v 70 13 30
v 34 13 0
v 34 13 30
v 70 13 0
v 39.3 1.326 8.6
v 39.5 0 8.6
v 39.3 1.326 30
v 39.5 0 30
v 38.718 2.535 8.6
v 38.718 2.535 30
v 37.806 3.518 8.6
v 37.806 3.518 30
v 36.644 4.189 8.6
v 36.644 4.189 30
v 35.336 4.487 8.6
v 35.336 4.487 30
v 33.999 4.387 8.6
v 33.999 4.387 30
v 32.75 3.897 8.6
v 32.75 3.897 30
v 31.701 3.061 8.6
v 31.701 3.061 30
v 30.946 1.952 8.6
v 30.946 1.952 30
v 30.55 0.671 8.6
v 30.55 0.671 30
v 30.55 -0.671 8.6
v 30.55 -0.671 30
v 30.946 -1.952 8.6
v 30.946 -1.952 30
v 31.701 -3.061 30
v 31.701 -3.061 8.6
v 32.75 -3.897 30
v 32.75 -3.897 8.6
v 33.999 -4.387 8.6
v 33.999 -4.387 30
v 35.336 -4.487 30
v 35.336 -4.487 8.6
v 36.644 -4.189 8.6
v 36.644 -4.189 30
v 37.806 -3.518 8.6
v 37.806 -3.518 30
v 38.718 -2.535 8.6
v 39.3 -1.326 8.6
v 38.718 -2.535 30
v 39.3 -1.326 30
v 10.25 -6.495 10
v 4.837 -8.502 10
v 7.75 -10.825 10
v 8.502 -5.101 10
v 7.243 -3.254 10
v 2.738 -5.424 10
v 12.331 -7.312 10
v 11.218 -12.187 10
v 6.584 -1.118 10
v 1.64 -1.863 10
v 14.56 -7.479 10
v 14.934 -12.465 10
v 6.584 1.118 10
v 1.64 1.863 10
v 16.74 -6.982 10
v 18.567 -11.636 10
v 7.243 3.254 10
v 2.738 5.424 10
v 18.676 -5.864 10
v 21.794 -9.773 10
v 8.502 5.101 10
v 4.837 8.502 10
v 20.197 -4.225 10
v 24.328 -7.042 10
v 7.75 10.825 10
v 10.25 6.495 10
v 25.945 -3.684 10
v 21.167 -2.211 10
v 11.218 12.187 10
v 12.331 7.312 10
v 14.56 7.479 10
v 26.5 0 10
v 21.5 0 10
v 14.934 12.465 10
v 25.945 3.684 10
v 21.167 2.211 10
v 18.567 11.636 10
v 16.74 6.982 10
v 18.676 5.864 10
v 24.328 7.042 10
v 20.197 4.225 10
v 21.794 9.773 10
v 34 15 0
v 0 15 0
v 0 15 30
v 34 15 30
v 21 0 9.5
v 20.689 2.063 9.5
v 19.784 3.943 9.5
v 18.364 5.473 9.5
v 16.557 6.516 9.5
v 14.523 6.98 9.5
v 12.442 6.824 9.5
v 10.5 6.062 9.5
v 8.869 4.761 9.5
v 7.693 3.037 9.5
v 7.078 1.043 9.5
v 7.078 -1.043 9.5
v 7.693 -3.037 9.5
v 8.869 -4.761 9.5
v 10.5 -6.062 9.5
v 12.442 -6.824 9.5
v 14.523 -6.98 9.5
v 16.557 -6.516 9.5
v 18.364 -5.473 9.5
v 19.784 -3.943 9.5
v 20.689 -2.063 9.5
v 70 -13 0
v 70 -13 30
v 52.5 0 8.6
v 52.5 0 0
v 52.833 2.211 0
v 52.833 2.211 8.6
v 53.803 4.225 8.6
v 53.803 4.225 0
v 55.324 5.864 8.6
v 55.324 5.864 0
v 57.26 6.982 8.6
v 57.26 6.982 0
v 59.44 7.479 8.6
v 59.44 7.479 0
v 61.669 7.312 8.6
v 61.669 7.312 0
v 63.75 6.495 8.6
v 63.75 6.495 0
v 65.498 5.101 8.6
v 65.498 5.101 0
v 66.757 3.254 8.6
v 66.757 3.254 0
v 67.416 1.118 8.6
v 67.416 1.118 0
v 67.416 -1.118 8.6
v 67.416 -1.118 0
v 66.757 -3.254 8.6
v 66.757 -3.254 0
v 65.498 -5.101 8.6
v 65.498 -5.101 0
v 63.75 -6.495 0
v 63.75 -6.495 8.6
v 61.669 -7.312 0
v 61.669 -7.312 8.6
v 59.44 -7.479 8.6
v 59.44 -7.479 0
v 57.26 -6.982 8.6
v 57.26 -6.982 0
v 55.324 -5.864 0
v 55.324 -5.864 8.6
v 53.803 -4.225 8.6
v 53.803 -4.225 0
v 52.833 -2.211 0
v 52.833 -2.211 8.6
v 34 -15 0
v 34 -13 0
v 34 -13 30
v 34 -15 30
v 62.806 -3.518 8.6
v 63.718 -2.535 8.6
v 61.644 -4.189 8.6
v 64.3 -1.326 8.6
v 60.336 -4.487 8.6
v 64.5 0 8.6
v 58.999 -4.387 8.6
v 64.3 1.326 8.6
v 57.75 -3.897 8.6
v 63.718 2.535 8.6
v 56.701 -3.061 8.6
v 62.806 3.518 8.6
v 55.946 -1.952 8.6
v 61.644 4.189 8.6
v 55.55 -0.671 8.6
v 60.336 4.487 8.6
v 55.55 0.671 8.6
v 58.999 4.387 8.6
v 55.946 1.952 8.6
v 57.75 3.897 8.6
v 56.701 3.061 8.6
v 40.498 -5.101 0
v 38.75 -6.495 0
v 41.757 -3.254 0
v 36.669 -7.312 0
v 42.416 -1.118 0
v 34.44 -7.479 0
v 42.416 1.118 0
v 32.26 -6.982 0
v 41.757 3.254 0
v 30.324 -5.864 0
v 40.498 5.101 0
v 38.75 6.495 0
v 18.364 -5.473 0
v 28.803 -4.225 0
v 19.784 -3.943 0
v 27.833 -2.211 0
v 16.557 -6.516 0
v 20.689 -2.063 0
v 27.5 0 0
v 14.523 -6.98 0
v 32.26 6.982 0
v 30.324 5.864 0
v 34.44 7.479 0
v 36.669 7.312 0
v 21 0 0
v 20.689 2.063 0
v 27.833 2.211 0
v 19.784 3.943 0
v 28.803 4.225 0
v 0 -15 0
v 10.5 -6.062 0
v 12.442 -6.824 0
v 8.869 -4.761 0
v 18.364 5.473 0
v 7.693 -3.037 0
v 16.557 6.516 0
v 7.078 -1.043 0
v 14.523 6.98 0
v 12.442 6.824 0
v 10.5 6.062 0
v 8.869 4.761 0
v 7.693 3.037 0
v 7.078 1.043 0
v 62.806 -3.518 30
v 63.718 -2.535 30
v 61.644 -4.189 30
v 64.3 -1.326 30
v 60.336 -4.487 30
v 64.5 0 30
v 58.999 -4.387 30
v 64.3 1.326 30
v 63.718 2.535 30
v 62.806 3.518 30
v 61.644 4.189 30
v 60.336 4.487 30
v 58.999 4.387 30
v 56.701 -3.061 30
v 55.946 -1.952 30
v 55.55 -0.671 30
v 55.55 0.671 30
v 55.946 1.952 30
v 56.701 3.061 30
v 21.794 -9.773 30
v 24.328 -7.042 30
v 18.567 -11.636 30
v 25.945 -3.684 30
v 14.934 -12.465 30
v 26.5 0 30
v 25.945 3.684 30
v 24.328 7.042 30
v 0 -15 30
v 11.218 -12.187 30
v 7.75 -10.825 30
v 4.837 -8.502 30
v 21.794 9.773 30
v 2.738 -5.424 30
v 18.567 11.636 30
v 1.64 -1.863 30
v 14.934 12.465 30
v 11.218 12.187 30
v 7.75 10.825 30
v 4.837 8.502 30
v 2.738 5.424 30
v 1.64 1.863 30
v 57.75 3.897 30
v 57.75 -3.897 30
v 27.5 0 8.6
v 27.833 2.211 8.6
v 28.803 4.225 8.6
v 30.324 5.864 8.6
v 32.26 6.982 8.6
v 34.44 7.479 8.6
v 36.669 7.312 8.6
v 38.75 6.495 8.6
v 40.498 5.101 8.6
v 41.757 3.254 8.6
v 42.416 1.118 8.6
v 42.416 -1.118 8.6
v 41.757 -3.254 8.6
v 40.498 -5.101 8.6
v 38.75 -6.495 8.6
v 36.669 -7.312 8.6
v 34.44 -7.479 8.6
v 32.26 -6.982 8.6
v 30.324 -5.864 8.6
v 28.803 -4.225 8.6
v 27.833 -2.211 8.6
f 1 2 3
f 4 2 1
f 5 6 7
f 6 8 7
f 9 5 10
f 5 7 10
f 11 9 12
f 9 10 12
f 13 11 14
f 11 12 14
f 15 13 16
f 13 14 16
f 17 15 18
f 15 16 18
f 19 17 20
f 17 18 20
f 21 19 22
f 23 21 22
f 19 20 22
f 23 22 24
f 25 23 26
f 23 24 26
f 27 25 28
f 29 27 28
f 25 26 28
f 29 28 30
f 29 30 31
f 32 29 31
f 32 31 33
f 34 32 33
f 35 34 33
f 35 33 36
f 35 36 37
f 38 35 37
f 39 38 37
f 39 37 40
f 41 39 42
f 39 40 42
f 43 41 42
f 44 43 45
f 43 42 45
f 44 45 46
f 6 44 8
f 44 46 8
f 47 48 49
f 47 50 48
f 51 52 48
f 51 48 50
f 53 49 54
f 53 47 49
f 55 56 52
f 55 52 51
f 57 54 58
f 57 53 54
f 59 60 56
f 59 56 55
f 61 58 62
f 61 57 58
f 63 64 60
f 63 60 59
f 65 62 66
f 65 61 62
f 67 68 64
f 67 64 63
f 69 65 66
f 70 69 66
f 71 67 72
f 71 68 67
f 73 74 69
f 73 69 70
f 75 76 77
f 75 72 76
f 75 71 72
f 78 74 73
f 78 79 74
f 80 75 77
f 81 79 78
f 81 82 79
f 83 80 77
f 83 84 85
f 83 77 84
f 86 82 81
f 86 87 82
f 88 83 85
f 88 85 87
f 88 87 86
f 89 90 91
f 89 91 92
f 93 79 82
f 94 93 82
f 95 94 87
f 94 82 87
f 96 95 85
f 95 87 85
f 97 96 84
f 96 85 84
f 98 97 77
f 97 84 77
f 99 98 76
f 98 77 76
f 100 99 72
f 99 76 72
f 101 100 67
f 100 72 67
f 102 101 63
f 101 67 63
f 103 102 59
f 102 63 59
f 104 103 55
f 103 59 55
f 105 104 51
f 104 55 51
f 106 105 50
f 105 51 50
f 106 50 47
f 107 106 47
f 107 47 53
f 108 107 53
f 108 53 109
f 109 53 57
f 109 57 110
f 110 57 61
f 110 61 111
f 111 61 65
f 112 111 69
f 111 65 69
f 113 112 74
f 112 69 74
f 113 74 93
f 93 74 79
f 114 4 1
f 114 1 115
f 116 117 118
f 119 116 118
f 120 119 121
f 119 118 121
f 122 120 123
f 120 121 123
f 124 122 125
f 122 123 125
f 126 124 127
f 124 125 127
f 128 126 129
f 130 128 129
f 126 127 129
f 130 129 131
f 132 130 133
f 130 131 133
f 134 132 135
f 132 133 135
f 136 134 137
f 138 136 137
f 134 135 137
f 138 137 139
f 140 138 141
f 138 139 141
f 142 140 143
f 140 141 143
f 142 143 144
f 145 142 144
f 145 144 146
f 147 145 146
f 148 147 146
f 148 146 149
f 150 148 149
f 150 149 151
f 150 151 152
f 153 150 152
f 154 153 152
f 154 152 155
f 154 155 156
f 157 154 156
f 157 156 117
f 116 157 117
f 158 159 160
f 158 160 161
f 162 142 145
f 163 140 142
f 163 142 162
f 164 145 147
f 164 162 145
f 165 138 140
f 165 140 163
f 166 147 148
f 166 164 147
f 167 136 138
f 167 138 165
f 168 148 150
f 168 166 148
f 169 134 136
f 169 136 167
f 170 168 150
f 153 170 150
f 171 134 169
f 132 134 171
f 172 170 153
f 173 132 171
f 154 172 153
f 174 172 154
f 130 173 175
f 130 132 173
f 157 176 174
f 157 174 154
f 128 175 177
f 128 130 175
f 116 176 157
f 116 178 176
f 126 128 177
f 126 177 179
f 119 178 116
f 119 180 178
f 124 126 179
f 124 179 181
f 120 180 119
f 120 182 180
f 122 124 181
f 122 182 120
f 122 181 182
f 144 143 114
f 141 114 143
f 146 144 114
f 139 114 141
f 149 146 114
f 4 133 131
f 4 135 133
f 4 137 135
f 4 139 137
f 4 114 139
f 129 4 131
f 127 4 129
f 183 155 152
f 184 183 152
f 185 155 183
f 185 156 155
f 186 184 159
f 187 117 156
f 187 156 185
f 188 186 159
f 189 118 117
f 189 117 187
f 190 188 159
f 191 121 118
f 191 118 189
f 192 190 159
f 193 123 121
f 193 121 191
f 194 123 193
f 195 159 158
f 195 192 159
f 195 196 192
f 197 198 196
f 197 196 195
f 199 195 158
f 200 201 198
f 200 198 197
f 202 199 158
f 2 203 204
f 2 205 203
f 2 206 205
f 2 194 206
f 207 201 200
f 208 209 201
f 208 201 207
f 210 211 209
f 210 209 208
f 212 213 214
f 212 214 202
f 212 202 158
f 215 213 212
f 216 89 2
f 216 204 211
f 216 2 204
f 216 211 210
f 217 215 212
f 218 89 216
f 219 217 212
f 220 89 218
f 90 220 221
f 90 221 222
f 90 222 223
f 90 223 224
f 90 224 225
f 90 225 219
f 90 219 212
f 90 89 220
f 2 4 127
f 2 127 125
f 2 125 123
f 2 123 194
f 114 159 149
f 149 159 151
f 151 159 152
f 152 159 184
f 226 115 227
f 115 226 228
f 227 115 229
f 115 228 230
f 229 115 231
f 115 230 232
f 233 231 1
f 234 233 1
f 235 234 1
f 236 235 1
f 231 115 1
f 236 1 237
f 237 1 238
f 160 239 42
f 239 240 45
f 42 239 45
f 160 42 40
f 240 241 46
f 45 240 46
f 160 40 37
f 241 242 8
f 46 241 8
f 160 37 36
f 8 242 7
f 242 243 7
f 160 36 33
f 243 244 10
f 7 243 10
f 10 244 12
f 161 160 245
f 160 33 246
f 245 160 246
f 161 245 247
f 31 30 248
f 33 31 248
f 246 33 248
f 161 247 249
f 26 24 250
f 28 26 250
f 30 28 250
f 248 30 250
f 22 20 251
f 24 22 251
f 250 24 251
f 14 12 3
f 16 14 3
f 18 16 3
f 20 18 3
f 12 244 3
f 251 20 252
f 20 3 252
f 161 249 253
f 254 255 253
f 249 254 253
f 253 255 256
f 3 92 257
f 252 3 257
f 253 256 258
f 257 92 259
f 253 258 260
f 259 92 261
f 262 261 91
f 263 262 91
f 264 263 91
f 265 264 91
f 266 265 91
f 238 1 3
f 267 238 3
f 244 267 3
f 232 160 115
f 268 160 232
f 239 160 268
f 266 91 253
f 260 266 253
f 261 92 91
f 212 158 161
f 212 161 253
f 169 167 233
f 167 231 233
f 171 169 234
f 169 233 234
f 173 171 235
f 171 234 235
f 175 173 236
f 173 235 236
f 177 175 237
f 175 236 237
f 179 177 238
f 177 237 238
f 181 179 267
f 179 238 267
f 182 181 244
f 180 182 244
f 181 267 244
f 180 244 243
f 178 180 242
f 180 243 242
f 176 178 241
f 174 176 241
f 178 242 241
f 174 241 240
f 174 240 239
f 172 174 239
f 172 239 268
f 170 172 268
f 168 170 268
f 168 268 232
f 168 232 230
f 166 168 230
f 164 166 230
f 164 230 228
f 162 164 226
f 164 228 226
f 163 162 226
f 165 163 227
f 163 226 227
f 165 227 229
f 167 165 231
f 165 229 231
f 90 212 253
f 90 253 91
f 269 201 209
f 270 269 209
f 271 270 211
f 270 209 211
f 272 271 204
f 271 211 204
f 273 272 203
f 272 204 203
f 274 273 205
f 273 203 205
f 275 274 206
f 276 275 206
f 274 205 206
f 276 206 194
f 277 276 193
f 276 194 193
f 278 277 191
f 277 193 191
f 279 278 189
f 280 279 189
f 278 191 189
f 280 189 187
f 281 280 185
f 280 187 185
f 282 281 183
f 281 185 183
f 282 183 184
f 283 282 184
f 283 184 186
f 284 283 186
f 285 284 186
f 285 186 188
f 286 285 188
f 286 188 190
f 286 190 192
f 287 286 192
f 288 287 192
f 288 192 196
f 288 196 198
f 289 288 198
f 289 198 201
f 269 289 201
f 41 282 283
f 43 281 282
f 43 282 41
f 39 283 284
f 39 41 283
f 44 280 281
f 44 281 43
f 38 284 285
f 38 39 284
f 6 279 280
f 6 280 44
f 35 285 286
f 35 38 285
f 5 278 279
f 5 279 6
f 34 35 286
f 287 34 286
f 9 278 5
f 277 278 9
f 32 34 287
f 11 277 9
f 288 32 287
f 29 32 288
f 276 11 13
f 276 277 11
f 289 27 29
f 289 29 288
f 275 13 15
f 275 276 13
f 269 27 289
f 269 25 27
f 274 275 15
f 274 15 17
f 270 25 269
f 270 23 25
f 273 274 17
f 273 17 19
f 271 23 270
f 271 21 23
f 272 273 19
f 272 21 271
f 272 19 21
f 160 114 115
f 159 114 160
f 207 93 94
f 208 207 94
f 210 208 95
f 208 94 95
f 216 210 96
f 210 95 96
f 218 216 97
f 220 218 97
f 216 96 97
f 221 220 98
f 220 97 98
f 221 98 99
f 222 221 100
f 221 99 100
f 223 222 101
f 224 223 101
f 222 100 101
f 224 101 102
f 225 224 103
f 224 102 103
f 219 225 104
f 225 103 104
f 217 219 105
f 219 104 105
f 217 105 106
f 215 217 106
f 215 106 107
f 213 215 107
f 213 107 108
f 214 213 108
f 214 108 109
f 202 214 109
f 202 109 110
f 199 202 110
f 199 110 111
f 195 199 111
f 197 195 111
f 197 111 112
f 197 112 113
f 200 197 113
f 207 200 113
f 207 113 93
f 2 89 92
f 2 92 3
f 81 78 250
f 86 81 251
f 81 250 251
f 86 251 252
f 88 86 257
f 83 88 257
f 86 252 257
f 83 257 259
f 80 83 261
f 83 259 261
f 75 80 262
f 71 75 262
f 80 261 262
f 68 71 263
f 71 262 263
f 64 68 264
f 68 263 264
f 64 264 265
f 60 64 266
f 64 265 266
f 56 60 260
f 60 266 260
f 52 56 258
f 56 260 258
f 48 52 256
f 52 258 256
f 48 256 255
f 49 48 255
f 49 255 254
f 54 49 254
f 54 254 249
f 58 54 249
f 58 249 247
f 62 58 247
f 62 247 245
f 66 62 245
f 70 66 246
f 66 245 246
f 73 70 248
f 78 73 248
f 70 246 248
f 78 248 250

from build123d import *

# Parameters (mm, degrees)
AUFSATZ_LINEAR_AUSTRAGEN1_DEPTH                      = 30
SKIZZE6_R                                            = 12.5
SCHNITT_LINEAR_AUSTRAGEN1_DEPTH                      = 20
M16_GEWINDEBOHRUNG1_D                                = 14
M16_GEWINDEBOHRUNG1_DEPTH                            = 42
M16_GEWINDEBOHRUNG1_TIP                              = 4.206024333
STIRNSENKUNG_F_R_M8_ZYLINDERSCHRAUBE_MIT_D           = 9
STIRNSENKUNG_F_R_M8_ZYLINDERSCHRAUBE_MIT_CBORE_D     = 15
STIRNSENKUNG_F_R_M8_ZYLINDERSCHRAUBE_MIT_CBORE_DEPTH = 8.6
FASE1_SIZE                                           = 0.5


with BuildPart() as part:
    # Skizze1 → Aufsatz-Linear austragen1 (new body)
    with BuildSketch(Plane.XY):
        Polygon((34, 15), (34, 13), (70, 13), (70, -13), (34, -13), (34, -15), (0, -15), (0, 15), align=None)
    extrude(amount=AUFSATZ_LINEAR_AUSTRAGEN1_DEPTH)

    # Skizze6 → Schnitt-Linear austragen1 (cut)
    with BuildSketch(Plane.XY.offset(30)):
        with Locations((14, 0)):
            Circle(SKIZZE6_R)
    extrude(amount=-SCHNITT_LINEAR_AUSTRAGEN1_DEPTH, mode=Mode.SUBTRACT)

    # M16 Gewindebohrung1
    with Locations(Plane(origin=(0, 0, 0), x_dir=(-1, 0, 0), z_dir=(0, 0, -1))):
        with Locations((-14, 0)):
            Hole(M16_GEWINDEBOHRUNG1_D / 2, depth=M16_GEWINDEBOHRUNG1_DEPTH)
            with Locations((0, 0, -(M16_GEWINDEBOHRUNG1_DEPTH + M16_GEWINDEBOHRUNG1_TIP / 2))):  # 118° drill point
                Cone(0, M16_GEWINDEBOHRUNG1_D / 2, M16_GEWINDEBOHRUNG1_TIP, mode=Mode.SUBTRACT)

    # Stirnsenkung für M8 Zylinderschraube mit Innensechskant1 (through all)
    with Locations(Plane(origin=(0, 0, 0), x_dir=(-1, 0, 0), z_dir=(0, 0, -1))):
        with Locations((-60, 0), (-35, 0)):
            CounterBoreHole(STIRNSENKUNG_F_R_M8_ZYLINDERSCHRAUBE_MIT_D / 2, STIRNSENKUNG_F_R_M8_ZYLINDERSCHRAUBE_MIT_CBORE_D / 2, STIRNSENKUNG_F_R_M8_ZYLINDERSCHRAUBE_MIT_CBORE_DEPTH)

    # Fase1
    fase1_edges = [part.edges().sort_by_distance(p)[0] for p in [
        (7, 0, 10),
    ]]
    chamfer(fase1_edges, length=FASE1_SIZE)


solid = part.part
